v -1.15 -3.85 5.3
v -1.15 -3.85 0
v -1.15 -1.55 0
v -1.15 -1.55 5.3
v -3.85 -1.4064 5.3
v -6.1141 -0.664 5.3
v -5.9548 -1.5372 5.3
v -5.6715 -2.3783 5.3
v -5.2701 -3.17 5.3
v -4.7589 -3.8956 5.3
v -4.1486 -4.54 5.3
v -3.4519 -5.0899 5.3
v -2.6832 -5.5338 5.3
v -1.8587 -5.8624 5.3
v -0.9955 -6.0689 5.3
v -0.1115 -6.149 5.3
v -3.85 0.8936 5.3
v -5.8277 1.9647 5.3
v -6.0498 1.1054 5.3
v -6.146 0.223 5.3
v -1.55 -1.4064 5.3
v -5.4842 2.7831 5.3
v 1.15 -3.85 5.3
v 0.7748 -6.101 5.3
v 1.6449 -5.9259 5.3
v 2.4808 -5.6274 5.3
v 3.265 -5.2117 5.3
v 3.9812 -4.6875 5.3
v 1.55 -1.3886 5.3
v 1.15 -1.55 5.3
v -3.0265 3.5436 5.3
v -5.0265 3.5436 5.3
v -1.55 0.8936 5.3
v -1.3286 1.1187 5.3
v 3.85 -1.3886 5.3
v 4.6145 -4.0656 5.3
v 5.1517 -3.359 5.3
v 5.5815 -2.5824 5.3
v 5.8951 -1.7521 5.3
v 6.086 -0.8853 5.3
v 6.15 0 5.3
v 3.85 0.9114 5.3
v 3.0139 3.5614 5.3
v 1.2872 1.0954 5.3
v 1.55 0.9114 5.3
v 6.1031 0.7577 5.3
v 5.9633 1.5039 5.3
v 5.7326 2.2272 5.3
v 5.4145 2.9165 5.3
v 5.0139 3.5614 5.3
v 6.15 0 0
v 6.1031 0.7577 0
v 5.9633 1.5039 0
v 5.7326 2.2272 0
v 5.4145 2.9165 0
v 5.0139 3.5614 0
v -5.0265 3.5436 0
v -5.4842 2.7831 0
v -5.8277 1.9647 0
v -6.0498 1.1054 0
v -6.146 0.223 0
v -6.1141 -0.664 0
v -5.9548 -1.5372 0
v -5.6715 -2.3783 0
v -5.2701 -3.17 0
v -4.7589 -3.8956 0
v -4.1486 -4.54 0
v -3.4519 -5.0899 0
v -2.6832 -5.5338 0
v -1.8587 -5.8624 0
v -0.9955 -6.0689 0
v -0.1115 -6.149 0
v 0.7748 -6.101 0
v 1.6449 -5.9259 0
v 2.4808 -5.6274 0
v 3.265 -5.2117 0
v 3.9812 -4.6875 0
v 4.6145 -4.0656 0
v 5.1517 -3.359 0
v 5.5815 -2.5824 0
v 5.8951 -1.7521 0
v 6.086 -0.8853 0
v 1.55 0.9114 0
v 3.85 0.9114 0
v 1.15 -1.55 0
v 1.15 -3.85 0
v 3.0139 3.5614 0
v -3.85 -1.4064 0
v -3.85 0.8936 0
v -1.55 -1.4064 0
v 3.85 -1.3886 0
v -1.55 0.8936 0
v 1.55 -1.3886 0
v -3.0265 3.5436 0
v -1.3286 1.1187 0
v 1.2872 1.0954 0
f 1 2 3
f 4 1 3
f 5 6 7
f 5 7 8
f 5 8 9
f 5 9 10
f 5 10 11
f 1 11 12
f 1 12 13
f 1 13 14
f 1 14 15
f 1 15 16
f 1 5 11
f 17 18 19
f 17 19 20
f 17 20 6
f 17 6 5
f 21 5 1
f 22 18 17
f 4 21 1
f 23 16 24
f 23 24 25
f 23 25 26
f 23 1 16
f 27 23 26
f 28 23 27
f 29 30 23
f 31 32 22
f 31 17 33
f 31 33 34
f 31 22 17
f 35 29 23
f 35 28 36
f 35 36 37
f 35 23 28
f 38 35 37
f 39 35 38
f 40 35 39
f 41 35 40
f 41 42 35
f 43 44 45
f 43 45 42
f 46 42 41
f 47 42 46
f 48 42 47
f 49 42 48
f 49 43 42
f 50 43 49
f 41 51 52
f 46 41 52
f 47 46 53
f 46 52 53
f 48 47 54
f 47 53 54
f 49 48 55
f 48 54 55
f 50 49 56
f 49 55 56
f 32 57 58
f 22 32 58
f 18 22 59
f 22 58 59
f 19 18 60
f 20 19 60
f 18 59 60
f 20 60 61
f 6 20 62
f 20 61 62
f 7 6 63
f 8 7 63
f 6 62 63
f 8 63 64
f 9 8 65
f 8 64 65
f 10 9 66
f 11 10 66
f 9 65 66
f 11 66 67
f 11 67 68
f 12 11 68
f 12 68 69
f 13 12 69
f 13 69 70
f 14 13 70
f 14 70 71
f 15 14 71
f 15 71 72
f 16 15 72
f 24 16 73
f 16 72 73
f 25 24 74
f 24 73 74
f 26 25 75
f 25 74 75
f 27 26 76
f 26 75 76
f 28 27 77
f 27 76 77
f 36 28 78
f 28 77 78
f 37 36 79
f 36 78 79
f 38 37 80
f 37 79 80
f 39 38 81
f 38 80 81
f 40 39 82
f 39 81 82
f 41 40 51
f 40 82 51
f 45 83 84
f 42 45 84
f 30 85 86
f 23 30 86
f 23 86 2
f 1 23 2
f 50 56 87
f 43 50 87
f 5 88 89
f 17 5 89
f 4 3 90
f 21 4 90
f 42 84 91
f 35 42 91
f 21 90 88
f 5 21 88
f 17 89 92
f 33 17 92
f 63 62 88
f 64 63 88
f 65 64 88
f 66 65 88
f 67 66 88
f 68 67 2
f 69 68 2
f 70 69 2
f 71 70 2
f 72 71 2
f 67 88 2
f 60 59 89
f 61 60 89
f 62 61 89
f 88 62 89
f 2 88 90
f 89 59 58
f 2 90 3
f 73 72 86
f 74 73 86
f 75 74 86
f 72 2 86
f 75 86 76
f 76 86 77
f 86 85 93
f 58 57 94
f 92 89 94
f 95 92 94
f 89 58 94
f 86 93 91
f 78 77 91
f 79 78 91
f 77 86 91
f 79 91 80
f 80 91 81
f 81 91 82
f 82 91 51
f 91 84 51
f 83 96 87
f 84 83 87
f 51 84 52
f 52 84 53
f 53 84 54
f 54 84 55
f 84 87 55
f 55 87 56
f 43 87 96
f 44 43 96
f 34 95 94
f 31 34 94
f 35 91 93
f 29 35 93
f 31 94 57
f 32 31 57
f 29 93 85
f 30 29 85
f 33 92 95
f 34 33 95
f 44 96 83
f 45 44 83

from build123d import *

# Parameters (mm, degrees)
F1_DEPTH = 5.3


with BuildPart() as f1:
    # F0 (on Top) → F1 (new body)
    with BuildSketch(Plane.XY):
        with BuildLine():
            ThreePointArc((-5.026474, 3.543595), (-1.858721, -5.862393), (6.15, 0))
            ThreePointArc((6.15, 0), (5.859092, 1.869103), (5.013888, 3.56138))
            Line((5.013888, 3.56138), (3.013888, 3.56138))
            Line((3.013888, 3.56138), (1.287191, 1.095401))
            Line((1.287191, 1.095401), (1.55, 0.91138))
            Line((1.55, 0.91138), (3.85, 0.91138))
            Line((3.85, 0.91138), (3.85, -1.38862))
            Line((3.85, -1.38862), (1.55, -1.38862))
            Line((1.55, -1.38862), (1.15, -1.55))
            Line((1.15, -1.55), (1.15, -3.85))
            Line((1.15, -3.85), (-1.15, -3.85))
            Line((-1.15, -3.85), (-1.15, -1.55))
            Line((-1.15, -1.55), (-1.55, -1.406405))
            Line((-1.55, -1.406405), (-3.85, -1.406405))
            Line((-3.85, -1.406405), (-3.85, 0.893595))
            Line((-3.85, 0.893595), (-1.55, 0.893595))
            Line((-1.55, 0.893595), (-1.328561, 1.118723))
            Line((-1.328561, 1.118723), (-3.026474, 3.543595))
            Line((-3.026474, 3.543595), (-5.026474, 3.543595))
        make_face()
    extrude(amount=F1_DEPTH)


solid = f1.part
